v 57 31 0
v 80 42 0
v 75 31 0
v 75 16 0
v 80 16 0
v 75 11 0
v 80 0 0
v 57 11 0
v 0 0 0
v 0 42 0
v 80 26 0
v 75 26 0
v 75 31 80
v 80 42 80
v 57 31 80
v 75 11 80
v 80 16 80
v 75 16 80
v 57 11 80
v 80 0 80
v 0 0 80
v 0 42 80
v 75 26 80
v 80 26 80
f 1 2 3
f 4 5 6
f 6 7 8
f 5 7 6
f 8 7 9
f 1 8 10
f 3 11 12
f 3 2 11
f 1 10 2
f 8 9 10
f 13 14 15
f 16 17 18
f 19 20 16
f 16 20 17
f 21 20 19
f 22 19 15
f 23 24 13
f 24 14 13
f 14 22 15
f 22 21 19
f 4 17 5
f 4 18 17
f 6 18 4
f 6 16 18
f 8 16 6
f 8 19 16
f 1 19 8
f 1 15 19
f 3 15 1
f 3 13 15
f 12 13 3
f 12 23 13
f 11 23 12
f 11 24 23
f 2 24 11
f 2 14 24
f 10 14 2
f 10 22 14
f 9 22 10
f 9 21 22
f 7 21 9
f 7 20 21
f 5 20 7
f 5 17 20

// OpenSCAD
$fn = 32;

// ----------------------------------------------------------------------
// T-slot rail: 80 x 42 mm section, 80 mm long
// ----------------------------------------------------------------------

// --- parameters (mm) ---
profile_height = 80;      // extrusion height
profile_points = 12;      // points of the closed outline

profile = [[0, 0], [80, 0], [80, 16], [75, 16], [75, 11], [57, 11], [57, 31], [75, 31], [75, 26], [80, 26], [80, 42], [0, 42]];  // single closed polygon, 12 points, counter clockwise

// --- the one profile operation ---
linear_extrude(height = profile_height) polygon(points = profile);
